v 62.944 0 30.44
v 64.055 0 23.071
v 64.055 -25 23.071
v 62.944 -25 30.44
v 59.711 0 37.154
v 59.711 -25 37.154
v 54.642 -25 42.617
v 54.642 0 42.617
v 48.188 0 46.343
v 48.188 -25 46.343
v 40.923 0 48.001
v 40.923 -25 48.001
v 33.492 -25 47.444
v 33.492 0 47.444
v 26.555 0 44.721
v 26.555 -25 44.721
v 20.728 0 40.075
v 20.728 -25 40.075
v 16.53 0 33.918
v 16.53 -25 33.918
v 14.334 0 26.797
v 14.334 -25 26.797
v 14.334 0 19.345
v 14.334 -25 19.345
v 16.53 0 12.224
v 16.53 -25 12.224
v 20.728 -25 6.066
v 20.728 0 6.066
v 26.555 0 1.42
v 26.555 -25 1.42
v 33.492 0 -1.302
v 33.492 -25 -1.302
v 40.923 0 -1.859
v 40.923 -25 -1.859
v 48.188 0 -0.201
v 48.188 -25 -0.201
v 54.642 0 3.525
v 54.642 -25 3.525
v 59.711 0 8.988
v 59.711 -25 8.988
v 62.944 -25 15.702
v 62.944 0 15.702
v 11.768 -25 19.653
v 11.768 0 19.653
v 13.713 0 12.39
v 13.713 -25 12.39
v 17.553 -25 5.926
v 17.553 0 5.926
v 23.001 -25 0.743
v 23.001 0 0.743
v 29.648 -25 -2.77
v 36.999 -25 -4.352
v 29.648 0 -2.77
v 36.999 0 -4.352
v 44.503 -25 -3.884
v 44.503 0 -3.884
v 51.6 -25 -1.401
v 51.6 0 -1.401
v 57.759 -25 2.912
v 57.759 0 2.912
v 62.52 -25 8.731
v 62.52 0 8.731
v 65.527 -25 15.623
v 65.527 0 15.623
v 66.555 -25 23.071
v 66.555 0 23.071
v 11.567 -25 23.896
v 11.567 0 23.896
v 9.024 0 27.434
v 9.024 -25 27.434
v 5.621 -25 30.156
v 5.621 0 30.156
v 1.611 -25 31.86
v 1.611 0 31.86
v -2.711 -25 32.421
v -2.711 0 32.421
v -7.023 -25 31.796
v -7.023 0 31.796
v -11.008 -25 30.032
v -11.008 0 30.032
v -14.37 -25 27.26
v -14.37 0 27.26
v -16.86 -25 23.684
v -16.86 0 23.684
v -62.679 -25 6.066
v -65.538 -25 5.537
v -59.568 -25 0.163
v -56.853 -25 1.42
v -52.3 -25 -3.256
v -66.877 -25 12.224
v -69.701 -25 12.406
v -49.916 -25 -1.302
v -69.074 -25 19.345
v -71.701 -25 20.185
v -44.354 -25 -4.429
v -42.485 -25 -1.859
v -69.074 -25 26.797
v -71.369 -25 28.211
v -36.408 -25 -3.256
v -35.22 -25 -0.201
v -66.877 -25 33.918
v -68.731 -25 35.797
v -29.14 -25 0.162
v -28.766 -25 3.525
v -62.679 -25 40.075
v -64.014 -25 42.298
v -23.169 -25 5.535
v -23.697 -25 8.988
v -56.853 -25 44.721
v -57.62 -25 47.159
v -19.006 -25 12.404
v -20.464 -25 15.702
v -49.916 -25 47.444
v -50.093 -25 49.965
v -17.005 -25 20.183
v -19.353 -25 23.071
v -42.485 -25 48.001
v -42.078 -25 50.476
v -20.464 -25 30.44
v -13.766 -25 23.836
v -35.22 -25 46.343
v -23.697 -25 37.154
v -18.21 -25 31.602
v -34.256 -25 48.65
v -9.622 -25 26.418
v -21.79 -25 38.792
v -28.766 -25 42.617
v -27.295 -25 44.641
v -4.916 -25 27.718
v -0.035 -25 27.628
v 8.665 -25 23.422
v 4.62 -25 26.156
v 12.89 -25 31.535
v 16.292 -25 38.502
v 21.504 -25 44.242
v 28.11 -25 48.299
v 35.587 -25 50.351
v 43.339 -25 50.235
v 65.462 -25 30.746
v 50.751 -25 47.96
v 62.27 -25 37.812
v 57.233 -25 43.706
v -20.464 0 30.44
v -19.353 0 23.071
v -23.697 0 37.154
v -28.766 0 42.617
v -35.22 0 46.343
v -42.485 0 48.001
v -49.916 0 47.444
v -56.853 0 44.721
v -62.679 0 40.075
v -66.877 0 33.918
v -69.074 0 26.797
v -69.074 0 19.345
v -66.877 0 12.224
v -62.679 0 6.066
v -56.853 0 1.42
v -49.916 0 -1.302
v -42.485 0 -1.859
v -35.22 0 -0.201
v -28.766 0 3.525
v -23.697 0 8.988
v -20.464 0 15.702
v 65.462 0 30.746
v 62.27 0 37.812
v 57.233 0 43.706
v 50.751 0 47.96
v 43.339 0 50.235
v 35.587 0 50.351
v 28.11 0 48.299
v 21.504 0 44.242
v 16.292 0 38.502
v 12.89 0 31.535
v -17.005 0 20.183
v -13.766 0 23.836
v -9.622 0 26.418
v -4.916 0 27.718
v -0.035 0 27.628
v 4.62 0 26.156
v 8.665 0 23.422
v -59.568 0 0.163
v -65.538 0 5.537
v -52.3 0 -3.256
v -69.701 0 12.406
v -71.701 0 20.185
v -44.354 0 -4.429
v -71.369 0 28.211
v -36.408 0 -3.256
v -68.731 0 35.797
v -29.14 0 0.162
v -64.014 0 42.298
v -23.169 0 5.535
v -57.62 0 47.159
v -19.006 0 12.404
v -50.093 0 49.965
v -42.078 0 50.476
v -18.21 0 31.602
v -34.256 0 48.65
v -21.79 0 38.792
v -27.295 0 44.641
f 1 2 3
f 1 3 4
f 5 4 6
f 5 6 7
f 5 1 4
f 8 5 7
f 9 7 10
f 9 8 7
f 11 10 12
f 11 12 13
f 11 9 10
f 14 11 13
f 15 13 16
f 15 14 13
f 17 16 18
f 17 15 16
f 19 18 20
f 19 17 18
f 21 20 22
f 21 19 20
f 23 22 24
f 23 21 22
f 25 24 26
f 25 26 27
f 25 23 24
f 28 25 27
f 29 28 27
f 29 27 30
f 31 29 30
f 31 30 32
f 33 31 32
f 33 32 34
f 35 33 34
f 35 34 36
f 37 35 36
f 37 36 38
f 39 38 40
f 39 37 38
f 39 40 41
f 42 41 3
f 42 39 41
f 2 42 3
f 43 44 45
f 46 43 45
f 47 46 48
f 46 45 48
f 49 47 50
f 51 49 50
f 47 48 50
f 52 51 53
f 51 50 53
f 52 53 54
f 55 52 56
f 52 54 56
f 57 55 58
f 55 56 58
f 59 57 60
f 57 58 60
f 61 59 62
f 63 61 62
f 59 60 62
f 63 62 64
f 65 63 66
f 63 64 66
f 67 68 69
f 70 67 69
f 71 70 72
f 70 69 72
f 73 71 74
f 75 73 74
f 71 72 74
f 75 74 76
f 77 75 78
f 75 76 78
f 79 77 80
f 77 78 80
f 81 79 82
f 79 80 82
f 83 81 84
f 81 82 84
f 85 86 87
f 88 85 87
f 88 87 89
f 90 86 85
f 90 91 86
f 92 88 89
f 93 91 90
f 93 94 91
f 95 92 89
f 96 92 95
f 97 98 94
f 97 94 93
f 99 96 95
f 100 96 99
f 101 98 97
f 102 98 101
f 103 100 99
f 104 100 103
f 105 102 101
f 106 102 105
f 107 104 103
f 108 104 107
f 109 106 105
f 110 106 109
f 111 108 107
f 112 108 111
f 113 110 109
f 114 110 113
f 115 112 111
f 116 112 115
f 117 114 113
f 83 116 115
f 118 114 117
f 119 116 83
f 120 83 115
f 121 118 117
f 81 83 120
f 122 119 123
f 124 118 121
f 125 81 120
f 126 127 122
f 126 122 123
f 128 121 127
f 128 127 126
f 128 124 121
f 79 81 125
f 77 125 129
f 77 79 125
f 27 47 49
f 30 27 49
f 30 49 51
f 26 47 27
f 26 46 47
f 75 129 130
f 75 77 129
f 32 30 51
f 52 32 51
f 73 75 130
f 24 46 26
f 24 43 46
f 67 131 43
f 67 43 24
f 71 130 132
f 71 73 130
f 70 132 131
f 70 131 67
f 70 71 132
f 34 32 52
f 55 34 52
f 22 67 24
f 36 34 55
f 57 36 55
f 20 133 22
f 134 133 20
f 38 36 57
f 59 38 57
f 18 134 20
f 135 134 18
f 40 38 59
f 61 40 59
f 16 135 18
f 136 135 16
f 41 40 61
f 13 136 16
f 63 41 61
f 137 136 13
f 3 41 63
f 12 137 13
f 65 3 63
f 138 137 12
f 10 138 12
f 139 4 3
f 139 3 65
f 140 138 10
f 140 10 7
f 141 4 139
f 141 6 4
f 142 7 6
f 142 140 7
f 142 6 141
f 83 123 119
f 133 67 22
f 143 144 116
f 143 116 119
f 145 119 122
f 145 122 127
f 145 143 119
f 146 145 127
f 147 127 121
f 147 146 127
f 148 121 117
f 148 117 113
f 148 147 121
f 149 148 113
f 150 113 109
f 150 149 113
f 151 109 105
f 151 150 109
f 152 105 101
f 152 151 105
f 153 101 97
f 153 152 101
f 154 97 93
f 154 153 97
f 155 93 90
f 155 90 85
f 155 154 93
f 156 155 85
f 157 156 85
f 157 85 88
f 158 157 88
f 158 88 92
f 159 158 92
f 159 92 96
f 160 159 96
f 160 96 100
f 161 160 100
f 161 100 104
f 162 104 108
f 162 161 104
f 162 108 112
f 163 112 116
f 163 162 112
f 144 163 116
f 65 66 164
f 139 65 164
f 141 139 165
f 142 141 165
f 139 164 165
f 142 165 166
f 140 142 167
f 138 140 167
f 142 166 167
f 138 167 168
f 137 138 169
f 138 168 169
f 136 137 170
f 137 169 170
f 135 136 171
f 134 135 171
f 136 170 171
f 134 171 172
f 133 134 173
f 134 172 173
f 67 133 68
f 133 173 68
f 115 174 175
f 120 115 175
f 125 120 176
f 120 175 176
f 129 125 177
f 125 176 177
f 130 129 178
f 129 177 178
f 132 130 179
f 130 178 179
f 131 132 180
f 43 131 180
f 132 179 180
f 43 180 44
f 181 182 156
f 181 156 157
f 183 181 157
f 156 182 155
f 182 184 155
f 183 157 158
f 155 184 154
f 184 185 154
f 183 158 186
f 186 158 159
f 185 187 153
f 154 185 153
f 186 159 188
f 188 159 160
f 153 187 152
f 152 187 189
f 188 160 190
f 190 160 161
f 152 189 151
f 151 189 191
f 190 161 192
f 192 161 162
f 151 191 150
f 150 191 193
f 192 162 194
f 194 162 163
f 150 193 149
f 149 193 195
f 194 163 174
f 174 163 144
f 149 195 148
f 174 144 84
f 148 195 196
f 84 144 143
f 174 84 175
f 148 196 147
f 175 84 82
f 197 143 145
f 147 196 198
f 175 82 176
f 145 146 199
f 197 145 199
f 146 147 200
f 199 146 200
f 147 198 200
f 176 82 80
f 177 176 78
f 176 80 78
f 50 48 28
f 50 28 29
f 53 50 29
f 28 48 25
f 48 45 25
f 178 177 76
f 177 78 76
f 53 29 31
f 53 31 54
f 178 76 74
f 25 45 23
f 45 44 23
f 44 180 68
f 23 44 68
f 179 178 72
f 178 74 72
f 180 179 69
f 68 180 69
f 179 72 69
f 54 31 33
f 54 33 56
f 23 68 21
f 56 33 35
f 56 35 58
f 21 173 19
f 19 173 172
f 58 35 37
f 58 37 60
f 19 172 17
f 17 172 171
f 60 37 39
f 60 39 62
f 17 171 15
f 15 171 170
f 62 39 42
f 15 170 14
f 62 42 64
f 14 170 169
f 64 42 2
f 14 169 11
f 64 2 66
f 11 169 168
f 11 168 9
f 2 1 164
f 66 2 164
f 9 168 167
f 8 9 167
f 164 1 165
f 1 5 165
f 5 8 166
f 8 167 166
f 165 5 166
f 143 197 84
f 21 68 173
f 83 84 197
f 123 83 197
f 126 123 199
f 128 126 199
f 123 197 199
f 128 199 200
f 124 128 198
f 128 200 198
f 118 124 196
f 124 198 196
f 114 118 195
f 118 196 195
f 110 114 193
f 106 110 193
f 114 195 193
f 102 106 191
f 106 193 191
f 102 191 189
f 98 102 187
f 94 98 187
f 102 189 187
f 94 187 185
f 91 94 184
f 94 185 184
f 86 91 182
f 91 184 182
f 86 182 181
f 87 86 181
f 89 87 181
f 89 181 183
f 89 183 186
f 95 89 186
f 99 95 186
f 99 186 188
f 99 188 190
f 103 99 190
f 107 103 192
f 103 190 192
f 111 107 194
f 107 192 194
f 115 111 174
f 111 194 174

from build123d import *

# Parameters (mm, degrees)
F0_R     = 25
F1_DEPTH = 25


with BuildPart() as f1:
    # F0 (on Front) → F1 (new body)
    with BuildSketch(Plane.XZ):
        with BuildLine():
            ThreePointArc((-17.005196, 20.183328), (-16.891213, 21.625071), (-16.853183, 23.070812))
            ThreePointArc((-16.853183, 23.070812), (-16.854895, 23.37759), (-16.860028, 23.68433))
            ThreePointArc((-16.860028, 23.68433), (-71.829573, 24.21011), (-17.005196, 20.183328))
        make_face()
        with Locations((-44.353183, 23.070812)):
            Circle(F0_R, mode=Mode.SUBTRACT)
        with BuildLine():
            ThreePointArc((-16.860028, 23.68433), (-16.854895, 23.37759), (-16.853183, 23.070812))
            ThreePointArc((-16.853183, 23.070812), (-16.891213, 21.625071), (-17.005196, 20.183328))
            ThreePointArc((-17.005196, 20.183328), (-2.472507, 27.848748), (11.767841, 19.653005))
            ThreePointArc((11.767841, 19.653005), (11.585381, 21.770557), (11.567004, 23.895875))
            ThreePointArc((11.567004, 23.895875), (-2.710738, 32.420641), (-16.860028, 23.68433))
        make_face()
        with BuildLine():
            ThreePointArc((66.554625, 23.070812), (39.467203, 50.567717), (11.567004, 23.895875))
            ThreePointArc((11.567004, 23.895875), (11.585381, 21.770557), (11.767841, 19.653005))
            ThreePointArc((11.767841, 19.653005), (40.766851, -4.375832), (66.554625, 23.070812))
        make_face()
        with Locations((39.054625, 23.070812)):
            Circle(F0_R, mode=Mode.SUBTRACT)
    extrude(amount=F1_DEPTH)


solid = f1.part
